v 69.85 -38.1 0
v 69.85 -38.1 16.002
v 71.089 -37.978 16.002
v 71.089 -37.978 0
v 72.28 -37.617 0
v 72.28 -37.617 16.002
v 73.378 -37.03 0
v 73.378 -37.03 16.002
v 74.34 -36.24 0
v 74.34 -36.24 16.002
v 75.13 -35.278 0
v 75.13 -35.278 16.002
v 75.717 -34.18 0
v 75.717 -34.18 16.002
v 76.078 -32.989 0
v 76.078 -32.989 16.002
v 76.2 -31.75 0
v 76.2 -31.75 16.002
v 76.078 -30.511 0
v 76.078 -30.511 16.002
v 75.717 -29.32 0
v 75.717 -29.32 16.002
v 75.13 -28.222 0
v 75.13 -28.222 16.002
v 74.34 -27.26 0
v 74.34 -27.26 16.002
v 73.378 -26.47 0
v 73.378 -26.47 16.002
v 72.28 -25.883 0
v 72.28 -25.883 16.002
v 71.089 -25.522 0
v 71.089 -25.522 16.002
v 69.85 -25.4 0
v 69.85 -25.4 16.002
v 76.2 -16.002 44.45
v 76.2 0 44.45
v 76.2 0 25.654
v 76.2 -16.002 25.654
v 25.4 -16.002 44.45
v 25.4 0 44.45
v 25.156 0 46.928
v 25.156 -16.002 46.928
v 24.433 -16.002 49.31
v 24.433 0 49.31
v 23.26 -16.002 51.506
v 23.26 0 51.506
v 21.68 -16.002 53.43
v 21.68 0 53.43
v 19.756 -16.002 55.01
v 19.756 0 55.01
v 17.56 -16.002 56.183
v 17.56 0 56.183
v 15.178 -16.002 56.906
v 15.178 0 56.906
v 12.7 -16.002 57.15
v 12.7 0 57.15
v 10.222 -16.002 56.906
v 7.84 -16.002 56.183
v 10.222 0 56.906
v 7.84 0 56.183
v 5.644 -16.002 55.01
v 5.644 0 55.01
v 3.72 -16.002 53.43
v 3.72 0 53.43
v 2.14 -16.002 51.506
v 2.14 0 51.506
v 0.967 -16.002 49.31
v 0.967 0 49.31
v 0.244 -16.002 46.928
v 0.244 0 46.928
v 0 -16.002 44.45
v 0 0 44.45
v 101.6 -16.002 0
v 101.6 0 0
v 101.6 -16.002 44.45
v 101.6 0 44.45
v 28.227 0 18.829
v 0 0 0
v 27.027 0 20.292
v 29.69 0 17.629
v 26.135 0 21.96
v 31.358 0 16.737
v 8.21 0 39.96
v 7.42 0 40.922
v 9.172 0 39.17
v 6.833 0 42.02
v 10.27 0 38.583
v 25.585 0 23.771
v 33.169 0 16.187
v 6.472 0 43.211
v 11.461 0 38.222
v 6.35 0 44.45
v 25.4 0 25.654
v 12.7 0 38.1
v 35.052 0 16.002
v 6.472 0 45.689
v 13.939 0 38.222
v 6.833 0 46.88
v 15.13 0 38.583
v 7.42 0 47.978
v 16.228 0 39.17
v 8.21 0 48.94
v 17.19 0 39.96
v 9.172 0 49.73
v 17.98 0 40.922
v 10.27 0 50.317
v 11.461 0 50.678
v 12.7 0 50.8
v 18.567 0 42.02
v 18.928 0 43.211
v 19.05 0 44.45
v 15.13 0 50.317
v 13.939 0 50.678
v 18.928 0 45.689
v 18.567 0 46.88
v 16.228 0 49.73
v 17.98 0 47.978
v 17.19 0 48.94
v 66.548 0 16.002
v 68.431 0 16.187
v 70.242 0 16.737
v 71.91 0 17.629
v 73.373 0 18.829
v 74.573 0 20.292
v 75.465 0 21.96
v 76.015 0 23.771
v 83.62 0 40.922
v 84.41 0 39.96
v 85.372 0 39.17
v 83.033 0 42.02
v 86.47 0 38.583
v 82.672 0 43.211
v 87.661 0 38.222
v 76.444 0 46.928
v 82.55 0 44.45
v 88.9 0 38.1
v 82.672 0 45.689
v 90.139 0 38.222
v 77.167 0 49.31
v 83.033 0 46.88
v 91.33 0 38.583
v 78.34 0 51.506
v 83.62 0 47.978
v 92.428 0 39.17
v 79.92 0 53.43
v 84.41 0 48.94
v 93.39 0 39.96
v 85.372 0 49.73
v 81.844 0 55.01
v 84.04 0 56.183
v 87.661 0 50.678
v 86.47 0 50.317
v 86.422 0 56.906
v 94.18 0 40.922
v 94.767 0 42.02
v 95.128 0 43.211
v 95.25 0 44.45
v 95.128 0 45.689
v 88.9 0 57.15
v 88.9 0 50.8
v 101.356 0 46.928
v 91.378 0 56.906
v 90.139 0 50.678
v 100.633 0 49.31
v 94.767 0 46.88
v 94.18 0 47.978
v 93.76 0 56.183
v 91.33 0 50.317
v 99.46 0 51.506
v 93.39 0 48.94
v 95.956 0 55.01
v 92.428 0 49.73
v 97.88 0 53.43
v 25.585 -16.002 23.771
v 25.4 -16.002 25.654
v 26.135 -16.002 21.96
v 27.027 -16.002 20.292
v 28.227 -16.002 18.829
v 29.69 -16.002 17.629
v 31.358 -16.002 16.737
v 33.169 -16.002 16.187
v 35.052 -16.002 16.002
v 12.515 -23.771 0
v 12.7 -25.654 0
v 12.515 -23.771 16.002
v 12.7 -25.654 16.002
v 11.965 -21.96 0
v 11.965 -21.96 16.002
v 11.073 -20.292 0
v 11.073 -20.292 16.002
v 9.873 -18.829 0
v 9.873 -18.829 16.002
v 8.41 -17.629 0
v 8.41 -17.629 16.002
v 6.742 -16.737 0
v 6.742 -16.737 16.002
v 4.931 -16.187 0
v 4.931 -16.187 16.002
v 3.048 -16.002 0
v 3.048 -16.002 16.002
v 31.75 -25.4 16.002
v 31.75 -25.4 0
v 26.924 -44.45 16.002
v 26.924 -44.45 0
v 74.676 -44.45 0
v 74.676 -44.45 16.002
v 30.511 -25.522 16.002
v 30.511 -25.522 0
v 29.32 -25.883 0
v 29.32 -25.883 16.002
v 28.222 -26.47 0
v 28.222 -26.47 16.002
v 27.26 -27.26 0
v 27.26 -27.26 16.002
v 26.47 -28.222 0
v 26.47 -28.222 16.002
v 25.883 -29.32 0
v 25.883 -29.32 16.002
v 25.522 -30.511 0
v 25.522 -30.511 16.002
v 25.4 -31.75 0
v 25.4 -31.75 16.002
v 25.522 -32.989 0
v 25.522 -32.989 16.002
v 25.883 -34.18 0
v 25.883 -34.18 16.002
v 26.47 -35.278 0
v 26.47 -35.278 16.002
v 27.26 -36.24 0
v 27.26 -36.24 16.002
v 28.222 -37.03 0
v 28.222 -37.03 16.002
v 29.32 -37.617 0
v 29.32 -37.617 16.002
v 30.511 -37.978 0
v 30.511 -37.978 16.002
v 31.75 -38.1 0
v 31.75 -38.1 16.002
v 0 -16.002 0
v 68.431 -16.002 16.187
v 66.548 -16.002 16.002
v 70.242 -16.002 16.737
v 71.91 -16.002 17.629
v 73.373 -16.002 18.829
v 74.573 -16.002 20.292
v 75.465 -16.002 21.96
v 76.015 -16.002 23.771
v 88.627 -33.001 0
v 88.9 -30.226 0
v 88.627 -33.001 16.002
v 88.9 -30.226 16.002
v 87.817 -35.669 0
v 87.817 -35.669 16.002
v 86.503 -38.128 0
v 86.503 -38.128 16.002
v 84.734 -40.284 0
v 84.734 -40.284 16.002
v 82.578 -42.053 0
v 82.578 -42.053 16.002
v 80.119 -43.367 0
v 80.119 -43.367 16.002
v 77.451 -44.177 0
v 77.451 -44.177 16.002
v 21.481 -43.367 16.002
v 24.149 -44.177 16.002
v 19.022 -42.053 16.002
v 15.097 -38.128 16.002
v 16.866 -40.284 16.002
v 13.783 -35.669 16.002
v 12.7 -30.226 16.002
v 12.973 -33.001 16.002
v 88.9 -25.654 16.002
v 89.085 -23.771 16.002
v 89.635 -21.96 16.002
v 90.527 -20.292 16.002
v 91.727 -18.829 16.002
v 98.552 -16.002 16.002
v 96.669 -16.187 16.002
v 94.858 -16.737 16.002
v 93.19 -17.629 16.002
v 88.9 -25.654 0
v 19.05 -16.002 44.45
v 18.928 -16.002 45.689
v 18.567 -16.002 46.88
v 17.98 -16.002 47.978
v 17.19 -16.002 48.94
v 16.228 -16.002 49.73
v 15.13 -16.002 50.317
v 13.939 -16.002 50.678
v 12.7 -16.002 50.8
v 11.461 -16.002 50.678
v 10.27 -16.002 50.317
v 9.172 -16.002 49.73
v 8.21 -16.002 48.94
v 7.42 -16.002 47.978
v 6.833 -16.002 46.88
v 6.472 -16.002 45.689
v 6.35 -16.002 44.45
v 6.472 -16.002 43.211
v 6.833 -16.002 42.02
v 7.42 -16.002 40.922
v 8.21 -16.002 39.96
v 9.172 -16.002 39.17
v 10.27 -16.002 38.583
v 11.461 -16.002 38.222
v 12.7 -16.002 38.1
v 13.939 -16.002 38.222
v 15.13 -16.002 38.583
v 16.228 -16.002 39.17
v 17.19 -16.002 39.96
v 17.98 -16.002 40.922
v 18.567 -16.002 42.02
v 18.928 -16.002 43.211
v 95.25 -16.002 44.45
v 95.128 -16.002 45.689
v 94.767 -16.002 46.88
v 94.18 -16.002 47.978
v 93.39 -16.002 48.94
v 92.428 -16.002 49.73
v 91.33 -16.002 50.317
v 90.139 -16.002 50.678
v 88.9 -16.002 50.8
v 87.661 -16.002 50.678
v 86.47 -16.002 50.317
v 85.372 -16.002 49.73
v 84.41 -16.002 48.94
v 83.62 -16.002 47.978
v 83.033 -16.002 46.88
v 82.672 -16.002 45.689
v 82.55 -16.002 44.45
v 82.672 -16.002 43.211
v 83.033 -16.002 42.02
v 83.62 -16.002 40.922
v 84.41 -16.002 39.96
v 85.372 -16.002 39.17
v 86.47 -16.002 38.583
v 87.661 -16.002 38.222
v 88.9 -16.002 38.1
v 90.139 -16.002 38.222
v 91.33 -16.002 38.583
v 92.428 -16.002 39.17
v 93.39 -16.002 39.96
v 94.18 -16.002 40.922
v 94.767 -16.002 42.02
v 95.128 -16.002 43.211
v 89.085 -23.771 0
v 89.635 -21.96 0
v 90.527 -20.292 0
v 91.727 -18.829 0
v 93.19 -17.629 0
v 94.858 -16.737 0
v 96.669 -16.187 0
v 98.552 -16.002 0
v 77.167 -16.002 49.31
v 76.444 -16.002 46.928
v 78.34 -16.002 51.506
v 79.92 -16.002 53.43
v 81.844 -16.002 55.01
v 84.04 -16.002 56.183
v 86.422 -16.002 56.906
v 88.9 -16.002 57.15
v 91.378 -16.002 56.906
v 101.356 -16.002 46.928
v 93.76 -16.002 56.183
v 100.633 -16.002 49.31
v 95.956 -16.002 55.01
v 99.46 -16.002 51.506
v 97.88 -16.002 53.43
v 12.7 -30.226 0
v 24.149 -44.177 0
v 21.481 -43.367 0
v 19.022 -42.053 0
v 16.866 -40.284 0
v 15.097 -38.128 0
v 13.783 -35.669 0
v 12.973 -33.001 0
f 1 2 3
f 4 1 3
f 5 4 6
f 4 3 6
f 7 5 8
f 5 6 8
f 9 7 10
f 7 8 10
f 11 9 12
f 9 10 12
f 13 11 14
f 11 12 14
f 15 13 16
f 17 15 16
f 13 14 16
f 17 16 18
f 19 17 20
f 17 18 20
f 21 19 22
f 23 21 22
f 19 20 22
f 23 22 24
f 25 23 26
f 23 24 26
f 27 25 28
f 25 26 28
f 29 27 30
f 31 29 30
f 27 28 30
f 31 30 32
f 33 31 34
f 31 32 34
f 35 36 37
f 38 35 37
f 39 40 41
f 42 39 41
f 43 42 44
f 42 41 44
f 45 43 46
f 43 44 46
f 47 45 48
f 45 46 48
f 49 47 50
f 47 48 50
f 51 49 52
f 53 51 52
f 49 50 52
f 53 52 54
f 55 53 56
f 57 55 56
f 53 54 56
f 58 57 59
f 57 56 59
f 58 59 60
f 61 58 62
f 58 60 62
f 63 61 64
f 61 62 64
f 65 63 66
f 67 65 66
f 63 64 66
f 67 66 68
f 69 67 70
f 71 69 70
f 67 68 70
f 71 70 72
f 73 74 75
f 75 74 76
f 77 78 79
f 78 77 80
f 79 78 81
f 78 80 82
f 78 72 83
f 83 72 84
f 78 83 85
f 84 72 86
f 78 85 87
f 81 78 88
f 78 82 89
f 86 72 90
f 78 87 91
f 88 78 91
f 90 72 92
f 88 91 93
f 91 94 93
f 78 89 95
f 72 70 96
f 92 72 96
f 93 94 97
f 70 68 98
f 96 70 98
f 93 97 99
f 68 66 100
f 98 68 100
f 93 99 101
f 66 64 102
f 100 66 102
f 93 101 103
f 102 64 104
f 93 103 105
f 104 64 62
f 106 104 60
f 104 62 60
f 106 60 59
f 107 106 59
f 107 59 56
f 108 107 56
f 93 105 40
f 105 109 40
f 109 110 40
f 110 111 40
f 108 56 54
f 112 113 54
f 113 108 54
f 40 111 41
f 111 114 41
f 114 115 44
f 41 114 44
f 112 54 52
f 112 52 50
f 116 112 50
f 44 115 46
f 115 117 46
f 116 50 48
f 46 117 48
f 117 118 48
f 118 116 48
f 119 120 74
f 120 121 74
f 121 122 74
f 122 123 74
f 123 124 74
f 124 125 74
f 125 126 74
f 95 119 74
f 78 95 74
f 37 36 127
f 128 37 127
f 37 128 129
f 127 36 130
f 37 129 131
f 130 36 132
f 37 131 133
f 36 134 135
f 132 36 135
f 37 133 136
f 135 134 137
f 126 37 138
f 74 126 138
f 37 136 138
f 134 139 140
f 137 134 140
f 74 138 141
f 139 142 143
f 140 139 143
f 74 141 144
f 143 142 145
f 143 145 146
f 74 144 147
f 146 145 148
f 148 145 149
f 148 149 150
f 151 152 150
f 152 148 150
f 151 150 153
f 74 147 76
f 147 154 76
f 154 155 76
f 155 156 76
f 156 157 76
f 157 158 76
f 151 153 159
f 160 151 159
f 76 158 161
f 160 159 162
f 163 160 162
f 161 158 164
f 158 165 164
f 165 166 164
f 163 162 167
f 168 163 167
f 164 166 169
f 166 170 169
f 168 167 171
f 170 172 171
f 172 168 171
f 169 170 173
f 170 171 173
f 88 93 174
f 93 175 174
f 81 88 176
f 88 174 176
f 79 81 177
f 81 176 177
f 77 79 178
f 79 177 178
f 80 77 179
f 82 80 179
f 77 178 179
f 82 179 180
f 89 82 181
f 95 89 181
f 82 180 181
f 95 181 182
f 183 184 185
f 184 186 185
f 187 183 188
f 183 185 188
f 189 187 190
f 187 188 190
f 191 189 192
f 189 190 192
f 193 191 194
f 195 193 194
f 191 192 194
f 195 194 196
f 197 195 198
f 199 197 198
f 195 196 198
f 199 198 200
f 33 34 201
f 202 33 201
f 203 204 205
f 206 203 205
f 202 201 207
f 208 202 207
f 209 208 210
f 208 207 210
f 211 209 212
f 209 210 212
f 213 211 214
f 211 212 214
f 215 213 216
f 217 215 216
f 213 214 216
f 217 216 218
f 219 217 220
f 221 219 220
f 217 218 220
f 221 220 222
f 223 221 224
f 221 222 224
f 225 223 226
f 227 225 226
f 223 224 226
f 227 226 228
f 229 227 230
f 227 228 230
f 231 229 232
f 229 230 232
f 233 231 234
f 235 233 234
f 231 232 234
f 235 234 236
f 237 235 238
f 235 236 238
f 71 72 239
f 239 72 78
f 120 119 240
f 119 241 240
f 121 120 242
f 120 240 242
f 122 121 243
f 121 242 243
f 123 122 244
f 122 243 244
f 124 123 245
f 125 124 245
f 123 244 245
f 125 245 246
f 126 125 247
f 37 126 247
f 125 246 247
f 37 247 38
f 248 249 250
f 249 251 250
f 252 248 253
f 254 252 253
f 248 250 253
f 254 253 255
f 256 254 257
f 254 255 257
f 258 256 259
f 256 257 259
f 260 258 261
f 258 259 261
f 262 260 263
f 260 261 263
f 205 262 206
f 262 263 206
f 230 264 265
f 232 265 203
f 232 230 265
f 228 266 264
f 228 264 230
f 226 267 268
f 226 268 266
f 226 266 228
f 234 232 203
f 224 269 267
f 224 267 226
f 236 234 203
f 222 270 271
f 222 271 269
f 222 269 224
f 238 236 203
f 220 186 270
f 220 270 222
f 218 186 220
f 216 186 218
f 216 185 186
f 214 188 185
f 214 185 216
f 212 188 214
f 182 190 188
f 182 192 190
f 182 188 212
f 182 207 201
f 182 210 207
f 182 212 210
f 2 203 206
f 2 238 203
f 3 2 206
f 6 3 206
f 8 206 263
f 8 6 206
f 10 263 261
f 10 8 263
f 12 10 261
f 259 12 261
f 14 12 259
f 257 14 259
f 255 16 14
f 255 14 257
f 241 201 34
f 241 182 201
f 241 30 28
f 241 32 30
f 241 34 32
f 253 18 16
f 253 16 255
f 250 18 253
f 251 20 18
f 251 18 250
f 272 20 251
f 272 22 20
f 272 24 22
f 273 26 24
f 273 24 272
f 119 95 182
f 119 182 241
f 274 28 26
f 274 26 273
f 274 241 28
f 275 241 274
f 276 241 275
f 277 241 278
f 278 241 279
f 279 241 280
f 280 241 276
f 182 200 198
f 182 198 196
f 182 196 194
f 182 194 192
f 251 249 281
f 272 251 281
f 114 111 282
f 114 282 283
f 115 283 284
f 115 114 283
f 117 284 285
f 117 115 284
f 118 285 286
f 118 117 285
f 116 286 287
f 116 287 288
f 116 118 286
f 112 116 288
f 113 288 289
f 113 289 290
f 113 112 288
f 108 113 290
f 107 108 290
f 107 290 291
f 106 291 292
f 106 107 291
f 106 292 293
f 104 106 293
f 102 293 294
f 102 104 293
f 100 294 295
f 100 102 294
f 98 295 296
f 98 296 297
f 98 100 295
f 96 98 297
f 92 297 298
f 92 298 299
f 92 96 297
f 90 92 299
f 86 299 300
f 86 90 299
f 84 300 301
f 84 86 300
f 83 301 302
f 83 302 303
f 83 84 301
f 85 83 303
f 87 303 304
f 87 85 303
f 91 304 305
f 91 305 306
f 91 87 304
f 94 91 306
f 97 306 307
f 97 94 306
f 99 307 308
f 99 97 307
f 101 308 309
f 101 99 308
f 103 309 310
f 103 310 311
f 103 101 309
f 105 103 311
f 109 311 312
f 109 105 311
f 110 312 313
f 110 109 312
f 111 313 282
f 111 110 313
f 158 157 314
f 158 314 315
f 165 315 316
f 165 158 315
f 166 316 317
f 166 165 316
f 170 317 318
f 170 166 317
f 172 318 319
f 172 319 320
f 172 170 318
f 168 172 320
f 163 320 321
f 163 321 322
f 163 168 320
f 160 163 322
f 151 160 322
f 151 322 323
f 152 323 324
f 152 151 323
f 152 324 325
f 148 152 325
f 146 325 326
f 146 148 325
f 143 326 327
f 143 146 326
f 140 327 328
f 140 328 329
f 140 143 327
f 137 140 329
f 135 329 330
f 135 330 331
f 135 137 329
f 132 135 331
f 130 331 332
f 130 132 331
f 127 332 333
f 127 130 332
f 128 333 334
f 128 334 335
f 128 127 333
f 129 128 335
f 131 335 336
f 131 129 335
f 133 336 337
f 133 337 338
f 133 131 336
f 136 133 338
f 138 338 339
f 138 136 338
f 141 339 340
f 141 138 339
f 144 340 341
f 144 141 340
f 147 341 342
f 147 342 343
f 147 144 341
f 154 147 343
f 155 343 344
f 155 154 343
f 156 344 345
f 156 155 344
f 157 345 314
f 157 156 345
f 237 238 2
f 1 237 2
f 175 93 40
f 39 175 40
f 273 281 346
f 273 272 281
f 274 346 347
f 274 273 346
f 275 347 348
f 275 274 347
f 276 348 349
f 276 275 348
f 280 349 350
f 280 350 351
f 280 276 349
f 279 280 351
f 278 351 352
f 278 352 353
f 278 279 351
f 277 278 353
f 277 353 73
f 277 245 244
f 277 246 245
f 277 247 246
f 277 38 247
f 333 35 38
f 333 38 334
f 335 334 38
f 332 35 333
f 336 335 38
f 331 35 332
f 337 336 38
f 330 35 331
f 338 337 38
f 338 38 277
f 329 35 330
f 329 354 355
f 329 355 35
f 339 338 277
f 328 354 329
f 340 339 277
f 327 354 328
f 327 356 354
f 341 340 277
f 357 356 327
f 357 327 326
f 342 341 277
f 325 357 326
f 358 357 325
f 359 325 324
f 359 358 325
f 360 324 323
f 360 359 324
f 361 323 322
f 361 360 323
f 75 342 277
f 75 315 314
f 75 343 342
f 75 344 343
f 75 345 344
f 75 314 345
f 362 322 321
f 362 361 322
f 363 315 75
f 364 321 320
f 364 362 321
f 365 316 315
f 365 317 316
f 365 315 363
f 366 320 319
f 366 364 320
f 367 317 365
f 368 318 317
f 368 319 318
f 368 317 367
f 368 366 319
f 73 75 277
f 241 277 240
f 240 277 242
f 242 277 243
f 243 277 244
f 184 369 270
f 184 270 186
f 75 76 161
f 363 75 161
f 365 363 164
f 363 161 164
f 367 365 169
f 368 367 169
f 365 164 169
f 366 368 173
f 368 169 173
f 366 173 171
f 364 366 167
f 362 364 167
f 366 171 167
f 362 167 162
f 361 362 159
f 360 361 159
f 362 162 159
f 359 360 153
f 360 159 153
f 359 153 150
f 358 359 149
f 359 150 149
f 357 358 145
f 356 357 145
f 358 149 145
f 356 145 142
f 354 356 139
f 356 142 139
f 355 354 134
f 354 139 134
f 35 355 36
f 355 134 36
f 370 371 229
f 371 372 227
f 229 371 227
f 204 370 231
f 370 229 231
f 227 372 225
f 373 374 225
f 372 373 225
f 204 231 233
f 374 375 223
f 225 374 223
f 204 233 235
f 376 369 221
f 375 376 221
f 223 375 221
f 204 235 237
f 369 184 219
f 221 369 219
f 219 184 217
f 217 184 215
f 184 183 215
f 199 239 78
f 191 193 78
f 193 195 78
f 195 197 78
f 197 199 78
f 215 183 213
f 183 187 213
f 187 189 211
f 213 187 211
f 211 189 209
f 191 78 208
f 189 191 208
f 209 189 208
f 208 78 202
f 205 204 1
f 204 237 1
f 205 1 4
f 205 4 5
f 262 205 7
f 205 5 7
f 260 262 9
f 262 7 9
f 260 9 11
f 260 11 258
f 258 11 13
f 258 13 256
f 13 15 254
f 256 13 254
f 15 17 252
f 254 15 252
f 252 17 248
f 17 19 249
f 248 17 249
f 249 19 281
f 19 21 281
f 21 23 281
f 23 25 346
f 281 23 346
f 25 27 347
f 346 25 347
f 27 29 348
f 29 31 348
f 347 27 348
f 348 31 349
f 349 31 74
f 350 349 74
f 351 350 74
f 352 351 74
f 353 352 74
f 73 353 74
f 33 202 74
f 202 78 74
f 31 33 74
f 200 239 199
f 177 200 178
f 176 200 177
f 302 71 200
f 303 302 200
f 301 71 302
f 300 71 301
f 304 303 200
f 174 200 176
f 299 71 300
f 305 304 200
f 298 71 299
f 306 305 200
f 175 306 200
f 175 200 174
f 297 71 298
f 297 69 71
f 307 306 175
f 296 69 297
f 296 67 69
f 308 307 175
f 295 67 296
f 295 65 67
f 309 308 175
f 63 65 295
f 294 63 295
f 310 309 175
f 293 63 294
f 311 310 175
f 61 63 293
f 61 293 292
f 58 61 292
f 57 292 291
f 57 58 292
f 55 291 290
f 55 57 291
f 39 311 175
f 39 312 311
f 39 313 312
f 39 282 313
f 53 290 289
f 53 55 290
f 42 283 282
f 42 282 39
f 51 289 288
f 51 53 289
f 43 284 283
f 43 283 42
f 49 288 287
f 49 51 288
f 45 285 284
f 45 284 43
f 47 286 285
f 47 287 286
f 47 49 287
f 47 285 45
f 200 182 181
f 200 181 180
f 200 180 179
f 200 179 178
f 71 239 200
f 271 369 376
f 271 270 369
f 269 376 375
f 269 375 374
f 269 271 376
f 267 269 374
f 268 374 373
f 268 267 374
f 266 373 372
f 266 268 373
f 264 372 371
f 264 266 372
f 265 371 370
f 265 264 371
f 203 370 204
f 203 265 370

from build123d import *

# Parameters (mm, degrees)
F0_R     = 6.35
F1_DEPTH = 16.002
F2_R     = 9.652
F3_W     = 76.2
F3_H     = 28.448
F4_DEPTH = 16.002
F5_R     = 9.652
F6_R     = 14.224
F8_DEPTH = 16.003


with BuildPart() as f1:
    # F0 (on Front) → F1 (new body)
    with BuildSketch(Plane.XZ):
        with BuildLine():
            ThreePointArc((25.4, 44.45), (12.7, 57.15), (0, 44.45))
            Line((0, 44.45), (0, 0))
            Line((0, 0), (101.6, 0))
            Line((101.6, 0), (101.6, 44.45))
            ThreePointArc((101.6, 44.45), (88.9, 57.15), (76.2, 44.45))
            Line((76.2, 44.45), (76.2, 16.002))
            Line((76.2, 16.002), (25.4, 16.002))
            Line((25.4, 16.002), (25.4, 44.45))
        make_face()
        with Locations((12.7, 44.45)):
            Circle(F0_R, mode=Mode.SUBTRACT)
        with Locations((88.9, 44.45)):
            Circle(F0_R, mode=Mode.SUBTRACT)
    extrude(amount=F1_DEPTH)

    # F2
    f2_edges = [f1.edges().sort_by_distance(p)[0] for p in [
        (25.4, -8.001, 16.002),
        (76.2, -8.001, 16.002),
    ]]
    fillet(f2_edges, radius=F2_R)

    # F3 (on Top) → F4 (join)
    with BuildSketch(Plane.XY):
        with Locations((50.8, -30.226)):
            Rectangle(F3_W, F3_H)
    extrude(amount=F4_DEPTH)

    # F5
    f5_edges = [f1.edges().sort_by_distance(p)[0] for p in [
        (12.7, -16.002, 8.001),
        (88.9, -16.002, 8.001),
    ]]
    fillet(f5_edges, radius=F5_R)

    # F6
    f6_edges = [f1.edges().sort_by_distance(p)[0] for p in [
        (12.7, -44.45, 8.001),
        (88.9, -44.45, 8.001),
    ]]
    fillet(f6_edges, radius=F6_R)

    # F7 (on face) → F8 (cut, through all)
    with BuildSketch(Plane.XY.offset(16.002)):
        with BuildLine():
            Line((69.85, -25.4), (31.75, -25.4))
            ThreePointArc((31.75, -25.4), (25.4, -31.75), (31.75, -38.1))
            Line((31.75, -38.1), (69.85, -38.1))
            ThreePointArc((69.85, -38.1), (76.2, -31.75), (69.85, -25.4))
        make_face()
    extrude(amount=-F8_DEPTH, mode=Mode.SUBTRACT)


solid = f1.part
